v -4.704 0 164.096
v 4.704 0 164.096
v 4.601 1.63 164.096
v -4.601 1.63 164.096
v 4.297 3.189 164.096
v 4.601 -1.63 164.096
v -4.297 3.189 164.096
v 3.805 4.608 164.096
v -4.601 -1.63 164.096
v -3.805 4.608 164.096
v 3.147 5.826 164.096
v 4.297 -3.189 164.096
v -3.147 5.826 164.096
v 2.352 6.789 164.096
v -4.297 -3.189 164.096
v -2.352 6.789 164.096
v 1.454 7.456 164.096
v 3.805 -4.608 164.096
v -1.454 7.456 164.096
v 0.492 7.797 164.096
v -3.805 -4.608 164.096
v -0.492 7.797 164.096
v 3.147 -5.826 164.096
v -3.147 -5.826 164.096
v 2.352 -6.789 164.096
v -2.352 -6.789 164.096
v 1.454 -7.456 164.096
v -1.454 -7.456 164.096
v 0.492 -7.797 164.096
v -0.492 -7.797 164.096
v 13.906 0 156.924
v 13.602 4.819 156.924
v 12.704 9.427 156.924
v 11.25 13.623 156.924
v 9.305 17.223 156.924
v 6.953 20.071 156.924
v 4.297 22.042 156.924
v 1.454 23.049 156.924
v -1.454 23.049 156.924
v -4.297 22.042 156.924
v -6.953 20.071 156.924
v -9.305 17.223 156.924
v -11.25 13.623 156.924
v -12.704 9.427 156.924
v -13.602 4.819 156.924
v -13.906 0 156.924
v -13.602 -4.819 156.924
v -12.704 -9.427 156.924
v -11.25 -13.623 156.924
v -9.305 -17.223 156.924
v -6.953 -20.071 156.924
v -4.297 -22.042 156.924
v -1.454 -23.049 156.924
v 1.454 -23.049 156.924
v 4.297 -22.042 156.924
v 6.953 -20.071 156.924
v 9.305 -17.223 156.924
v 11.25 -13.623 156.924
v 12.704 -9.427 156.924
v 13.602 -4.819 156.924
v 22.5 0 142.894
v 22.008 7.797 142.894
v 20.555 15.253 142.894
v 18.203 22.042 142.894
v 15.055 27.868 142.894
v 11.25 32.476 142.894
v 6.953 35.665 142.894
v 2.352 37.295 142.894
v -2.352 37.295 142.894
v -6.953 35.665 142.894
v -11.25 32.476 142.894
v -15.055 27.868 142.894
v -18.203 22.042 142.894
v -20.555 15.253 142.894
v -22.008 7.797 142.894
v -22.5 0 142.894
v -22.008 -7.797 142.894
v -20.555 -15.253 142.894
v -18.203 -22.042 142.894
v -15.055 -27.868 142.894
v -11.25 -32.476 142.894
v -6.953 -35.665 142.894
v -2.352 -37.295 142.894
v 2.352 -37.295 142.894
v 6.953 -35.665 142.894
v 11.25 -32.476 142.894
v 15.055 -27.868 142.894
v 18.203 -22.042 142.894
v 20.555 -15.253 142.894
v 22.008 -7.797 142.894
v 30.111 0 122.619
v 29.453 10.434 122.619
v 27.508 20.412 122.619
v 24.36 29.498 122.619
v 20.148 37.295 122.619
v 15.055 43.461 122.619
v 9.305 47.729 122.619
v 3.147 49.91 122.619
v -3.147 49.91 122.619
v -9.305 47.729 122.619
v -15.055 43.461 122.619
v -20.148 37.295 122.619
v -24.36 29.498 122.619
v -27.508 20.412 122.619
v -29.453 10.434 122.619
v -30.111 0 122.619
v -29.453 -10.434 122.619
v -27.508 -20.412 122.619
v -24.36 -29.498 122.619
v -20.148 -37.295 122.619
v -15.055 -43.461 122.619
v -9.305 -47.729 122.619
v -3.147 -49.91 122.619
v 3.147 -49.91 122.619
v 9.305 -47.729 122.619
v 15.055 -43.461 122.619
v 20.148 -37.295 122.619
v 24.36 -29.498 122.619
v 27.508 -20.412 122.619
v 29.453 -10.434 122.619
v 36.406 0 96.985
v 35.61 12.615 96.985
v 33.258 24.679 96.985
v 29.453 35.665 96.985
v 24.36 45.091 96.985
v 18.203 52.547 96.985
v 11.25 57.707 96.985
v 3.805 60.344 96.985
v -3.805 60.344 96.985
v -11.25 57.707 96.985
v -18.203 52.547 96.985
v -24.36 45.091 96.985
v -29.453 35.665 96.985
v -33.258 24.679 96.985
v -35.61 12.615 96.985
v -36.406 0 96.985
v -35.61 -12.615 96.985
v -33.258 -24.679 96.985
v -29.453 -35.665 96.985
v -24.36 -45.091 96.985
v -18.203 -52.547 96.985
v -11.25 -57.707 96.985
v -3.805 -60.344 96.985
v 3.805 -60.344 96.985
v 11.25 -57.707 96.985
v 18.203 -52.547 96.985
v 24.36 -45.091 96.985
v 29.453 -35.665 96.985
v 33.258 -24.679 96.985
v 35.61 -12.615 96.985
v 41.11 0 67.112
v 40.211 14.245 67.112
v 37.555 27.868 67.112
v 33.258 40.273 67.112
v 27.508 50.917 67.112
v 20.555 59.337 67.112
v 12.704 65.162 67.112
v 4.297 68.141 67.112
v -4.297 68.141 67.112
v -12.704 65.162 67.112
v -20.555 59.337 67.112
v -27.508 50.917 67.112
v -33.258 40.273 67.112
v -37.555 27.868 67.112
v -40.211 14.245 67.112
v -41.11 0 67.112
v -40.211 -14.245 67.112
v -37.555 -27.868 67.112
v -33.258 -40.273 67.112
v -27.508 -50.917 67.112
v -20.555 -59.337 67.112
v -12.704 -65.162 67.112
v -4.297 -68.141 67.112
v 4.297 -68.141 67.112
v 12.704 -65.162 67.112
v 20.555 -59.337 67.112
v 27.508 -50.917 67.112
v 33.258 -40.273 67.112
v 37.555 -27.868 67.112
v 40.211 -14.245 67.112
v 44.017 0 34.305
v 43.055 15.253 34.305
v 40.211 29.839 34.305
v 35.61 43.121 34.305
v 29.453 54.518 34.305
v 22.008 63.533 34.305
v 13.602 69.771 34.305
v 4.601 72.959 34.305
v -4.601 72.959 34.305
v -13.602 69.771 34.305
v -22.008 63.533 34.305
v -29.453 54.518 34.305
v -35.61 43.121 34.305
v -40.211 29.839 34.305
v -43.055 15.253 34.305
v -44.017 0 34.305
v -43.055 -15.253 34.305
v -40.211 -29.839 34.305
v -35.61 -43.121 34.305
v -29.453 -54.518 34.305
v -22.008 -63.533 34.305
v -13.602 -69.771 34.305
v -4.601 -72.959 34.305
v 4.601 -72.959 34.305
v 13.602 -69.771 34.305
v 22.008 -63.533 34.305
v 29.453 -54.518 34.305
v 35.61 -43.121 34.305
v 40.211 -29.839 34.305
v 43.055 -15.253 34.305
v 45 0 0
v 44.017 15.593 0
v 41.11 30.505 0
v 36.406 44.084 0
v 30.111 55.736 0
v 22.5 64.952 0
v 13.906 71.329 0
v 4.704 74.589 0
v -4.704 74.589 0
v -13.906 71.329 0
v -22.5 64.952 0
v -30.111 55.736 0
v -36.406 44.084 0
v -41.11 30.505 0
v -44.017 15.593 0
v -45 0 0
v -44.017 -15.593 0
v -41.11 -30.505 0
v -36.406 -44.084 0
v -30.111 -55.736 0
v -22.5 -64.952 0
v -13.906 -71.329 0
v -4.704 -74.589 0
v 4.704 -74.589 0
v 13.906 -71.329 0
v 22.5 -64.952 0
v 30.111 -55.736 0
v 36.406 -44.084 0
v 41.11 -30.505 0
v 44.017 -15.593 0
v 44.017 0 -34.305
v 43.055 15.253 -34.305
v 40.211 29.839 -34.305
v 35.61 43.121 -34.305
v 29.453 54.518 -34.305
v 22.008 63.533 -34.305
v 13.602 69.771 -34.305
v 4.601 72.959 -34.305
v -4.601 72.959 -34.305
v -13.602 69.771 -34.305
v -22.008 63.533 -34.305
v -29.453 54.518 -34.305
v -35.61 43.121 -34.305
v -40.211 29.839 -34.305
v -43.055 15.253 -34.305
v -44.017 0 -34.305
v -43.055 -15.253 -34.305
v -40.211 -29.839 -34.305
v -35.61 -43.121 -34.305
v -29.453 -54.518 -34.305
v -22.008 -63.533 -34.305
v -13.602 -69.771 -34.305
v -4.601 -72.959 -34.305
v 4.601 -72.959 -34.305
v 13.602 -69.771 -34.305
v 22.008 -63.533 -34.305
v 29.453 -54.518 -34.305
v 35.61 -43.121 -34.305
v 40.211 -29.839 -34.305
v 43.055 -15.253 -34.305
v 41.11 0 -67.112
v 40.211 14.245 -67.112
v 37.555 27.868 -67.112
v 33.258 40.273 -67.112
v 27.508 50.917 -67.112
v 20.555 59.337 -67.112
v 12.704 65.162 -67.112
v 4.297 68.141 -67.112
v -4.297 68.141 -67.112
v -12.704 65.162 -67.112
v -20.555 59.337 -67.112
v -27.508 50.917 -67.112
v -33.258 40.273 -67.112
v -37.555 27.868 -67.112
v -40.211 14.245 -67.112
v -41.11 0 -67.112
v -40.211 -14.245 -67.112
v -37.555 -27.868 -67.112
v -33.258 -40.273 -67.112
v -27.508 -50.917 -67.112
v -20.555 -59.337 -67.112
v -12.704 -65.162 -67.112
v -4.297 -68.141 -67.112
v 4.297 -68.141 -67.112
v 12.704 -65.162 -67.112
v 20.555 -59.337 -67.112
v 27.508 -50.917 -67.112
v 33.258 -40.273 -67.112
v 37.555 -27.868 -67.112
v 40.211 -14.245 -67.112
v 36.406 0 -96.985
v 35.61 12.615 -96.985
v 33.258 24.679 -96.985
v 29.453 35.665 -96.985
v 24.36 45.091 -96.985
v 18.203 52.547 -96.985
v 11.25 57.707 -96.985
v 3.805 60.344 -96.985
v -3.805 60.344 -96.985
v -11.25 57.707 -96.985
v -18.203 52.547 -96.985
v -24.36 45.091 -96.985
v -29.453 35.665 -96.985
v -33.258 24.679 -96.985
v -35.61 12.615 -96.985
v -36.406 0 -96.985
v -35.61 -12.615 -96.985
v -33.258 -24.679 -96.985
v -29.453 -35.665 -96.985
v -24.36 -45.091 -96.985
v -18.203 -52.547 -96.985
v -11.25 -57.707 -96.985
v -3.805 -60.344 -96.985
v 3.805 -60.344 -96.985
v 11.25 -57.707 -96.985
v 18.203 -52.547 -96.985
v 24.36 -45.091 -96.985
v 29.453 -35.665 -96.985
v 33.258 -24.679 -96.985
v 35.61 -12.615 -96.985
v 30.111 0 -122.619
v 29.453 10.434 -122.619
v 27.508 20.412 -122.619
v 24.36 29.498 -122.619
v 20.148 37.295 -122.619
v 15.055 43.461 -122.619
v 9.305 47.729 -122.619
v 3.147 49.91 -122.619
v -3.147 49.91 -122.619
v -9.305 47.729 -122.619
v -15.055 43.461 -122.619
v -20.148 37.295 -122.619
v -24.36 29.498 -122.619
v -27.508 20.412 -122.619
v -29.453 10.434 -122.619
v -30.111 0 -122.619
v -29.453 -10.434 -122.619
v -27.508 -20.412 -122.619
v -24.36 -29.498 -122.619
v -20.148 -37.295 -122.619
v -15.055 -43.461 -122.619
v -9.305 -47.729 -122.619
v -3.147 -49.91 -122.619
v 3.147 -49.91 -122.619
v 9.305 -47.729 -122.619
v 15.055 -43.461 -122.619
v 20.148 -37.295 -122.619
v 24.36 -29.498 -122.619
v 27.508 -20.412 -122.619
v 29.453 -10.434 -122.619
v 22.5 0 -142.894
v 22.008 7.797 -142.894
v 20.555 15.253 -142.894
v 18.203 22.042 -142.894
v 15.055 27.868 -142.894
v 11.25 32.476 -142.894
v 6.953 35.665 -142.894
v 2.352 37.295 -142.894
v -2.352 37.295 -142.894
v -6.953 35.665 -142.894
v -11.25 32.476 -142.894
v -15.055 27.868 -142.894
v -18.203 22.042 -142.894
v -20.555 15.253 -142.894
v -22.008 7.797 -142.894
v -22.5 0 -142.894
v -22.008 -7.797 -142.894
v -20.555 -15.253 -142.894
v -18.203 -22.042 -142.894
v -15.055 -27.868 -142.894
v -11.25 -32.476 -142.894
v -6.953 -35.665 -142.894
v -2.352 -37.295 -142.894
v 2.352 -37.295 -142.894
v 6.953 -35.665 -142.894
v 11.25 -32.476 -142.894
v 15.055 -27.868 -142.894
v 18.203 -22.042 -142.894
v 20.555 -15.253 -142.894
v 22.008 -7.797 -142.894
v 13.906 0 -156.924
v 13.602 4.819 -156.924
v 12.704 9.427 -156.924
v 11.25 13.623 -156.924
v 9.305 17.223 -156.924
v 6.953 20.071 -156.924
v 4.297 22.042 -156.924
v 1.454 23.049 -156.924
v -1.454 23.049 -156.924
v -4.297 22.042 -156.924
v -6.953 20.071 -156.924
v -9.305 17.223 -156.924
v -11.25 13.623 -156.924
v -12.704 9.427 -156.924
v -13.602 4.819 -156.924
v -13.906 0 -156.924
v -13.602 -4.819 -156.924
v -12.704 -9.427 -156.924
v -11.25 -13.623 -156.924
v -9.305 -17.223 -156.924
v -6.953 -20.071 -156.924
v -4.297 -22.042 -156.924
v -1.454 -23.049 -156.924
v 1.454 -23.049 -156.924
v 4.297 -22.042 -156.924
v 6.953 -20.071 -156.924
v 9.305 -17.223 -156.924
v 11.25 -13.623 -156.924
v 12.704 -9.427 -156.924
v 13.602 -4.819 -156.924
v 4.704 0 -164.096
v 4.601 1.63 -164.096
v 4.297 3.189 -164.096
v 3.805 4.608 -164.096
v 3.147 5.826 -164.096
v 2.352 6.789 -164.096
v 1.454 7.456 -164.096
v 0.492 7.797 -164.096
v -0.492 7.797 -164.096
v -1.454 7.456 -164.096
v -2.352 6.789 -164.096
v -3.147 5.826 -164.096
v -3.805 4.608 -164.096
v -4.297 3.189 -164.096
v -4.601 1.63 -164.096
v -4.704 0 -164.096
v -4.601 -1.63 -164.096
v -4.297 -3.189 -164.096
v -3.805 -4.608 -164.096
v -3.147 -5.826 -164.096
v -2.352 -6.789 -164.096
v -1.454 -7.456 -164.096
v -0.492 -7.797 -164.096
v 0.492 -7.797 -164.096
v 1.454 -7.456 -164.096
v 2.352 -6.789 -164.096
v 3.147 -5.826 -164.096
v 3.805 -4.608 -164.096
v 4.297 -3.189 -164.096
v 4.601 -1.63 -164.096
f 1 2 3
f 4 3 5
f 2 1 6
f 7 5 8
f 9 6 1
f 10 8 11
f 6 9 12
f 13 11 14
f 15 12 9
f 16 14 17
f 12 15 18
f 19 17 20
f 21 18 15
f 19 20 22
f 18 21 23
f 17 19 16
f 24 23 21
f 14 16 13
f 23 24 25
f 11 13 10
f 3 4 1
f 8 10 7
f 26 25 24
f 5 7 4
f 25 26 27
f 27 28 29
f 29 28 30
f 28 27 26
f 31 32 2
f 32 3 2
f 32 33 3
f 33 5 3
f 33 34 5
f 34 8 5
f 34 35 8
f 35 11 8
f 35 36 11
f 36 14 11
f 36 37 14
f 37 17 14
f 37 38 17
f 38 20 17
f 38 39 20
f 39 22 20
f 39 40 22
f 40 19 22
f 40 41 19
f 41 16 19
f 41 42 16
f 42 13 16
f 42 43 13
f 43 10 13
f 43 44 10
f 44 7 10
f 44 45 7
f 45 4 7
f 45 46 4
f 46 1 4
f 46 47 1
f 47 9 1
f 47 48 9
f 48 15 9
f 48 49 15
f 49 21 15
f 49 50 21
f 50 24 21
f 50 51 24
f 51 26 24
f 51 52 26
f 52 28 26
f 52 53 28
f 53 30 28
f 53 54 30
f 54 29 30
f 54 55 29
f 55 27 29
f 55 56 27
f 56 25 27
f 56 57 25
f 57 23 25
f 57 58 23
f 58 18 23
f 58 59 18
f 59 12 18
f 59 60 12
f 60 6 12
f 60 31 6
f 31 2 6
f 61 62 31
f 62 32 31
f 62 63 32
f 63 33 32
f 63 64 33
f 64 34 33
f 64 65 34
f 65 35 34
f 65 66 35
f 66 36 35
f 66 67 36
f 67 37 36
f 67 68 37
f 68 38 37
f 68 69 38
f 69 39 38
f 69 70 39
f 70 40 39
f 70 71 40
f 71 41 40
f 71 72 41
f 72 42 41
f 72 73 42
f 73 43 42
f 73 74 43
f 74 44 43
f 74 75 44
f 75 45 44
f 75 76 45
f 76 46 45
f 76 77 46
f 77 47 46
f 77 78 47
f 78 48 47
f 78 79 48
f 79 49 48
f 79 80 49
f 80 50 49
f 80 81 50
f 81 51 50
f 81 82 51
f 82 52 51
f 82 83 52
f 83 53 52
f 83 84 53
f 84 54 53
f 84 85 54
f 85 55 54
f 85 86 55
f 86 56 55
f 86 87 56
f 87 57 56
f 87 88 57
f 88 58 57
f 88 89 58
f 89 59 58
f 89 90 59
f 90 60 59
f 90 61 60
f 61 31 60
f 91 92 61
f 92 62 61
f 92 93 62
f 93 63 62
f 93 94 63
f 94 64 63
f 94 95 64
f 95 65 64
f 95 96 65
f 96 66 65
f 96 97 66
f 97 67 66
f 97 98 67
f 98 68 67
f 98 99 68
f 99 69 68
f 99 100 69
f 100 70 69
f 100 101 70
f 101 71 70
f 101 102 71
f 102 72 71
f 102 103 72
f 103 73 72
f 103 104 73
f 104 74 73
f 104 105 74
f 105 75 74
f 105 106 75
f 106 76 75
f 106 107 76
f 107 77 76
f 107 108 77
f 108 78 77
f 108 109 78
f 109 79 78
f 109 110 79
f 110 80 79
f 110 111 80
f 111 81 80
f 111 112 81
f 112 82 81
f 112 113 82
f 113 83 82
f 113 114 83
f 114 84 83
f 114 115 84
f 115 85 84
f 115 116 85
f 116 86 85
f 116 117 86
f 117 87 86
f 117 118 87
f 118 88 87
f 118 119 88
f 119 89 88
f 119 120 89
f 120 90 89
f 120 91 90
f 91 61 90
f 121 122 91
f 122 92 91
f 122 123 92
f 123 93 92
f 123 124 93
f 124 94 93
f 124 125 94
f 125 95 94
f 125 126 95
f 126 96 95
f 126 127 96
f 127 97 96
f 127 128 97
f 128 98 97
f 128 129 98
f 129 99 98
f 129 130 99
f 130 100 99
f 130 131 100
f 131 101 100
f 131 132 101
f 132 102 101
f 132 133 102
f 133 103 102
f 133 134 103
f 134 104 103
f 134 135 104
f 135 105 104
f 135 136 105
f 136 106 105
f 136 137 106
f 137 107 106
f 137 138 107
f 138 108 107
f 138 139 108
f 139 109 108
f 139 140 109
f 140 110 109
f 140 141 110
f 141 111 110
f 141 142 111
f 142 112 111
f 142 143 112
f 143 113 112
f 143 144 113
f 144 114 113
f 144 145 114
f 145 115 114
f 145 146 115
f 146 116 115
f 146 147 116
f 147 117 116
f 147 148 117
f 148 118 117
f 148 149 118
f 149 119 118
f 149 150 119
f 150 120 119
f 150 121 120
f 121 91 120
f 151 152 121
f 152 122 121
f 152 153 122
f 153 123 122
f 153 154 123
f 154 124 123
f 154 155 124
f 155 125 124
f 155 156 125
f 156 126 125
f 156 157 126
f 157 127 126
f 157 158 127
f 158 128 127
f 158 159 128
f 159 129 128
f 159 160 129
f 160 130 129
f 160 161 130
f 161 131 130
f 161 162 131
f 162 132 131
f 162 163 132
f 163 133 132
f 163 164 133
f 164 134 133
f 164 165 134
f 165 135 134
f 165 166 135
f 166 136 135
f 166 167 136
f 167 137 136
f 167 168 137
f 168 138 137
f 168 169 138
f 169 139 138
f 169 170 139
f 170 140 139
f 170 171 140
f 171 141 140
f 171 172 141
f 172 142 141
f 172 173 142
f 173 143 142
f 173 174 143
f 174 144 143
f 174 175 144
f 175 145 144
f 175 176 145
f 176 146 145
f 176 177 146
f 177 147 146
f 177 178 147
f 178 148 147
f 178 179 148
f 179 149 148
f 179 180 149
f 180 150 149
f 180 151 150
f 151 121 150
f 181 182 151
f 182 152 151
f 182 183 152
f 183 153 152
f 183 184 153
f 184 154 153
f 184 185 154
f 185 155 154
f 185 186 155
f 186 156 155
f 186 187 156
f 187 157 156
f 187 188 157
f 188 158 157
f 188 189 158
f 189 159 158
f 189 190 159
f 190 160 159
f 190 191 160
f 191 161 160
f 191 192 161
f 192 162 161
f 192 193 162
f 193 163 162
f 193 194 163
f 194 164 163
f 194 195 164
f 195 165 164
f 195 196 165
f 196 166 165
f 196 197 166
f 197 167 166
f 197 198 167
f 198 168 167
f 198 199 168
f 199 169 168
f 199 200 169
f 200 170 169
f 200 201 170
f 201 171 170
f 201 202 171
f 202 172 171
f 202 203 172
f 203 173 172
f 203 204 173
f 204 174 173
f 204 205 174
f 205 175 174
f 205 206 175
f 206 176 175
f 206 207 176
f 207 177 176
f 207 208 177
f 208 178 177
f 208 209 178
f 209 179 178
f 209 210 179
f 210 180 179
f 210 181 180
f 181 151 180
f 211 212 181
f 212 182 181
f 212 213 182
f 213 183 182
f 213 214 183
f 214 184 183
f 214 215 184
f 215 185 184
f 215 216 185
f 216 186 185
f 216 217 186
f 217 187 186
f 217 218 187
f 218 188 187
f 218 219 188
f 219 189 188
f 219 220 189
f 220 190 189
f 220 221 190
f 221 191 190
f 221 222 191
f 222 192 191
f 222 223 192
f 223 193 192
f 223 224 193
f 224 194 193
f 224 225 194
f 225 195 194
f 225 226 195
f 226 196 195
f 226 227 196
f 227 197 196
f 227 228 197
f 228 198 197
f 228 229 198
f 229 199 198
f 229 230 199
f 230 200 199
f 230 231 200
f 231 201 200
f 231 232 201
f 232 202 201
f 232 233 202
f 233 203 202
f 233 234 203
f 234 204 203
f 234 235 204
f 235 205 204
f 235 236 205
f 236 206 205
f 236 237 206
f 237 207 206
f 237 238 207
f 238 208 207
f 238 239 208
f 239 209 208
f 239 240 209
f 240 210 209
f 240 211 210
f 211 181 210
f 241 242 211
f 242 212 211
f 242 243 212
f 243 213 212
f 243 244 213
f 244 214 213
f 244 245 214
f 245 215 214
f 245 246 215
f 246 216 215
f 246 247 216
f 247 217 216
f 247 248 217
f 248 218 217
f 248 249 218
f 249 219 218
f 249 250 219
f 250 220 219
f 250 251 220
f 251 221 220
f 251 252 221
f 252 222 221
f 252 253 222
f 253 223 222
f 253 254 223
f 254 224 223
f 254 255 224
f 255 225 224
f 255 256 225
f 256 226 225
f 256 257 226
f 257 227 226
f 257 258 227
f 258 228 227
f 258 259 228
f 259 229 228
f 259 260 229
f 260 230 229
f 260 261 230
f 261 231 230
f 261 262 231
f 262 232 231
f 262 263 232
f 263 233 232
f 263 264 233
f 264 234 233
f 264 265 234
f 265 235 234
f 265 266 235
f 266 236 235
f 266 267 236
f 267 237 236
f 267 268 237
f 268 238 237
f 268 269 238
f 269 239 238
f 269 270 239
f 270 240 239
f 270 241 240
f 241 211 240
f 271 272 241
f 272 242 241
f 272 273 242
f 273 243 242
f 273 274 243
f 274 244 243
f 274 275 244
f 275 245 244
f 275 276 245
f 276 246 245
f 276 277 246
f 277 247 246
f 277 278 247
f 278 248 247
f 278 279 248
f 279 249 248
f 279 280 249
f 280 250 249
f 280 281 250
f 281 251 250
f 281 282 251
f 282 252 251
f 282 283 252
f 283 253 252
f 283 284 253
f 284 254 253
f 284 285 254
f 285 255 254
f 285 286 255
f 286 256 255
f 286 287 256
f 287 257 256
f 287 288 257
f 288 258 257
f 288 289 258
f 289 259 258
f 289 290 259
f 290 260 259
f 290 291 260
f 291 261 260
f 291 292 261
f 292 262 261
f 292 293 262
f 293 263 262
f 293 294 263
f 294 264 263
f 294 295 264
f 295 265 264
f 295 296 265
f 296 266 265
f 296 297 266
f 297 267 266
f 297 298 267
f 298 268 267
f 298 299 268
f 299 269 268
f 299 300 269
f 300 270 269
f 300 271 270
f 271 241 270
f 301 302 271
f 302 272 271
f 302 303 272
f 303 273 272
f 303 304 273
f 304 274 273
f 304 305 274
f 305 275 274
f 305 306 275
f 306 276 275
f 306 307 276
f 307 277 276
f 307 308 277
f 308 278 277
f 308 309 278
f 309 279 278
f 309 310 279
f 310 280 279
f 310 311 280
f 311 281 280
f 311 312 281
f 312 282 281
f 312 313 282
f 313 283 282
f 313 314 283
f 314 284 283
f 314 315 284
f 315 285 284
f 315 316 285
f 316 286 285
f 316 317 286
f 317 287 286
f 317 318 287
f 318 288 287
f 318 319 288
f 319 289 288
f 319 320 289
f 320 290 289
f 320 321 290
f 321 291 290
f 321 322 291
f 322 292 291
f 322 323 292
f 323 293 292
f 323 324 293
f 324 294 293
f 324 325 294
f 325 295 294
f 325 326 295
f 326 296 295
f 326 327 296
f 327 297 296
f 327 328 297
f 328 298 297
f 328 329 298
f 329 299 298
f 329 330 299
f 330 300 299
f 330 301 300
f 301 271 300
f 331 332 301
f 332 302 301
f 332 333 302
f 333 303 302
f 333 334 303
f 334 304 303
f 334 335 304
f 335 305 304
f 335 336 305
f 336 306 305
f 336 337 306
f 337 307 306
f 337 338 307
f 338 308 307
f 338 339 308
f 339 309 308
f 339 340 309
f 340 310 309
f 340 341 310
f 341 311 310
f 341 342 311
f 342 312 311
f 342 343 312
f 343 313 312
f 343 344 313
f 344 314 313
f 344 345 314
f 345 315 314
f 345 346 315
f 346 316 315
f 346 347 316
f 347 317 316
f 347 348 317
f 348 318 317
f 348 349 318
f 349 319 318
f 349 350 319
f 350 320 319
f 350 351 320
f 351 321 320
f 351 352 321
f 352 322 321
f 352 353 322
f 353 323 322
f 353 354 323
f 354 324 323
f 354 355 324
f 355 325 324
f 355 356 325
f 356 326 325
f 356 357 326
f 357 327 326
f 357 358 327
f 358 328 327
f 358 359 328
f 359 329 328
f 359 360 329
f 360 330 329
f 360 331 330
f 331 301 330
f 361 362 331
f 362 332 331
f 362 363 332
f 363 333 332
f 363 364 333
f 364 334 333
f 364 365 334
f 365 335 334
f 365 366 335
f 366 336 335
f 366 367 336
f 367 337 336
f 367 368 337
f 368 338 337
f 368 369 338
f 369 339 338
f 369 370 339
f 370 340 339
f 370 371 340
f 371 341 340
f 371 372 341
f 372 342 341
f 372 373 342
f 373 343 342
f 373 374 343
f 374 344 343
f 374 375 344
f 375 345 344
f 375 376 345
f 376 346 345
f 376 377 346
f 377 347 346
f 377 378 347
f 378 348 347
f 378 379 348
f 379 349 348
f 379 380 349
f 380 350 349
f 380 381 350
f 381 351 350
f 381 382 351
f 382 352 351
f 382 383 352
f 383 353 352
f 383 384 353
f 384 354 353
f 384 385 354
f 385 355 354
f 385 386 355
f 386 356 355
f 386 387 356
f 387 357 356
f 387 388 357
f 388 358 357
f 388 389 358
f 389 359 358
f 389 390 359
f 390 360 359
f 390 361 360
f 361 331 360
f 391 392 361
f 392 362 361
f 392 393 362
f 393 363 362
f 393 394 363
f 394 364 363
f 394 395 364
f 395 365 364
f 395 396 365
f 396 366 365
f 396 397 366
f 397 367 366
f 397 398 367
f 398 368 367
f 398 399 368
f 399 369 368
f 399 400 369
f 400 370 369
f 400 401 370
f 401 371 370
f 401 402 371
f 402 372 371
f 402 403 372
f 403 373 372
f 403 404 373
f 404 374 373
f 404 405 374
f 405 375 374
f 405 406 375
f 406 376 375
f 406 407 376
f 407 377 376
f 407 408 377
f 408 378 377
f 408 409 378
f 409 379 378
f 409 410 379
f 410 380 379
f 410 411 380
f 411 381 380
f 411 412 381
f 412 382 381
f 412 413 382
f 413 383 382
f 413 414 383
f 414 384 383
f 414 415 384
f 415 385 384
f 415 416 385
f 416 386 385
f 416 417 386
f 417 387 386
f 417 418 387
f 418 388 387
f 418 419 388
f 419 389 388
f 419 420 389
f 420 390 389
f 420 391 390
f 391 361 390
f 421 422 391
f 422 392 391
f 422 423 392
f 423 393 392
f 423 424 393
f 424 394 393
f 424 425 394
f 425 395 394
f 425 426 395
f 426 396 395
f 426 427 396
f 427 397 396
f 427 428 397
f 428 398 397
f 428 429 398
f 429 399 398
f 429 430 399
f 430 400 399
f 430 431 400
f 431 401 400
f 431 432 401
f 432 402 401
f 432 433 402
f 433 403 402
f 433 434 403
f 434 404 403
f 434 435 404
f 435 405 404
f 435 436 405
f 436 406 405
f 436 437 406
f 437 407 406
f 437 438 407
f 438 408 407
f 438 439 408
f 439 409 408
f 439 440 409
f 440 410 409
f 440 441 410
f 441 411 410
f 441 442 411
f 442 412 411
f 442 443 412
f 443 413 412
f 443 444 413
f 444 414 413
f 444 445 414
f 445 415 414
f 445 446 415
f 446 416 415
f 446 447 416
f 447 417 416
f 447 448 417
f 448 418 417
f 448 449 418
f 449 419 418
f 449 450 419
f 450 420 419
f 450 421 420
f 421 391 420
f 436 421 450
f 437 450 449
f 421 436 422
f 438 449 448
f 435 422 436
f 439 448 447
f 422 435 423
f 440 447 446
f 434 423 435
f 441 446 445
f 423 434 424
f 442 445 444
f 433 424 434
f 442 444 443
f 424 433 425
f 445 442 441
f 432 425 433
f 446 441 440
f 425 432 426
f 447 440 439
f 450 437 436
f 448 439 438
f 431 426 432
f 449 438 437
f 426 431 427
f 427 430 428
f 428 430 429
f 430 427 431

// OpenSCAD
// Generated by SolidPython 1.0.1 on 2020-07-29 00:39:25


scale(v = [3, 5, 11]) {
	sphere(r = 15);
}
/***********************************************
*********      SolidPython code:      **********
************************************************
 
# import packages: SolidPython
from solid import *
from solid.utils import *
from itertools import chain, combinations


class Resize:

    def __init__(self, scad_file):
        self.scad_file = scad_file
        #self.scad_file = import_scad(scad_file)
        # cone/cylinder param:
        self.r1 = 0
        self.r2 = 0
        self.h = 0
        # rectangular prism param:
        self.w = 0
        self.l = 0
        # ellipse param:
        self.r = 0

    # import OpenScad code (file name corresponds to shape)


    # classify shape + parameters
    def assign(self, param1, param2, param3):
        if self.scad_file == 'cone.scad':
            self.r1 = param1
            self.r2 = param2
            self.h = param3
        elif self.scad_file == 'cylinder.scad':
            self.r1 = param1
            self.r2 = param2
            self.h = param3
        elif self.scad_file == 'rectangularPrism.scad':
            self.h = param1
            self.l = param2
            self.w = param3
        else:
            self.r = param1
            self.h = param2

    # resize parameters
    def iterate(self):
        x = range(3, 20, 2)
        i = 1
        if self.scad_file == 'cone.scad':
            tempList = list(combinations(x, 2))
            for temp in tempList:
                param1 = temp[0]
                param2 = temp[1]
                filepath = 'produced_scad_files/' + 'cone' + str(param1) + '_' + str(param2) + '_' + '.scad'
                scad_render_to_file(cylinder(h=param1, r1=param2, r2=0), filepath)

        elif self.scad_file == 'cylinder.scad':
            tempList = list(combinations(x, 3))
            for temp in tempList:
                param1 = temp[0]
                param2 = temp[1]
                filepath = 'produced_scad_files/' + 'cylinder' + str(param1) + '_' + str(param2) + '_' + '.scad'
                scad_render_to_file(cylinder(h=param1, r1=param2, r2=param2), filepath)

        elif self.scad_file == 'rectangularPrism.scad':
            tempList = list(combinations(x, 3))
            for temp in tempList:
                param1 = temp[0]
                param2 = temp[1]
                param3 = temp[2]
                filepath = 'produced_scad_files/' + 'rectangularPrism' + str(param1) + '_' + str(param2) + '_' + str(
                    param3) + '.scad'
                scad_render_to_file(cube(size=(param1, param2, param3)), filepath)

        elif self.scad_file == 'ellipse.scad':
            tempList = list(combinations(x, 4))
            for temp in tempList:
                param1 = temp[0]
                param2 = temp[1]
                param3 = temp[2]
                param4 = temp[3]
                filepath = 'produced_scad_files/' + 'ellipse' + str(param1) + '_' + str(param2) + '_' + str(param3) + '_' + str(param4) + '.scad'
                scad_render_to_file(scale([param1, param2, param3])(sphere(r=param4)), filepath)

    def render_to_scadfile(self):
        scad_render_to_file(scad, 'example.scad') 
 
************************************************/
